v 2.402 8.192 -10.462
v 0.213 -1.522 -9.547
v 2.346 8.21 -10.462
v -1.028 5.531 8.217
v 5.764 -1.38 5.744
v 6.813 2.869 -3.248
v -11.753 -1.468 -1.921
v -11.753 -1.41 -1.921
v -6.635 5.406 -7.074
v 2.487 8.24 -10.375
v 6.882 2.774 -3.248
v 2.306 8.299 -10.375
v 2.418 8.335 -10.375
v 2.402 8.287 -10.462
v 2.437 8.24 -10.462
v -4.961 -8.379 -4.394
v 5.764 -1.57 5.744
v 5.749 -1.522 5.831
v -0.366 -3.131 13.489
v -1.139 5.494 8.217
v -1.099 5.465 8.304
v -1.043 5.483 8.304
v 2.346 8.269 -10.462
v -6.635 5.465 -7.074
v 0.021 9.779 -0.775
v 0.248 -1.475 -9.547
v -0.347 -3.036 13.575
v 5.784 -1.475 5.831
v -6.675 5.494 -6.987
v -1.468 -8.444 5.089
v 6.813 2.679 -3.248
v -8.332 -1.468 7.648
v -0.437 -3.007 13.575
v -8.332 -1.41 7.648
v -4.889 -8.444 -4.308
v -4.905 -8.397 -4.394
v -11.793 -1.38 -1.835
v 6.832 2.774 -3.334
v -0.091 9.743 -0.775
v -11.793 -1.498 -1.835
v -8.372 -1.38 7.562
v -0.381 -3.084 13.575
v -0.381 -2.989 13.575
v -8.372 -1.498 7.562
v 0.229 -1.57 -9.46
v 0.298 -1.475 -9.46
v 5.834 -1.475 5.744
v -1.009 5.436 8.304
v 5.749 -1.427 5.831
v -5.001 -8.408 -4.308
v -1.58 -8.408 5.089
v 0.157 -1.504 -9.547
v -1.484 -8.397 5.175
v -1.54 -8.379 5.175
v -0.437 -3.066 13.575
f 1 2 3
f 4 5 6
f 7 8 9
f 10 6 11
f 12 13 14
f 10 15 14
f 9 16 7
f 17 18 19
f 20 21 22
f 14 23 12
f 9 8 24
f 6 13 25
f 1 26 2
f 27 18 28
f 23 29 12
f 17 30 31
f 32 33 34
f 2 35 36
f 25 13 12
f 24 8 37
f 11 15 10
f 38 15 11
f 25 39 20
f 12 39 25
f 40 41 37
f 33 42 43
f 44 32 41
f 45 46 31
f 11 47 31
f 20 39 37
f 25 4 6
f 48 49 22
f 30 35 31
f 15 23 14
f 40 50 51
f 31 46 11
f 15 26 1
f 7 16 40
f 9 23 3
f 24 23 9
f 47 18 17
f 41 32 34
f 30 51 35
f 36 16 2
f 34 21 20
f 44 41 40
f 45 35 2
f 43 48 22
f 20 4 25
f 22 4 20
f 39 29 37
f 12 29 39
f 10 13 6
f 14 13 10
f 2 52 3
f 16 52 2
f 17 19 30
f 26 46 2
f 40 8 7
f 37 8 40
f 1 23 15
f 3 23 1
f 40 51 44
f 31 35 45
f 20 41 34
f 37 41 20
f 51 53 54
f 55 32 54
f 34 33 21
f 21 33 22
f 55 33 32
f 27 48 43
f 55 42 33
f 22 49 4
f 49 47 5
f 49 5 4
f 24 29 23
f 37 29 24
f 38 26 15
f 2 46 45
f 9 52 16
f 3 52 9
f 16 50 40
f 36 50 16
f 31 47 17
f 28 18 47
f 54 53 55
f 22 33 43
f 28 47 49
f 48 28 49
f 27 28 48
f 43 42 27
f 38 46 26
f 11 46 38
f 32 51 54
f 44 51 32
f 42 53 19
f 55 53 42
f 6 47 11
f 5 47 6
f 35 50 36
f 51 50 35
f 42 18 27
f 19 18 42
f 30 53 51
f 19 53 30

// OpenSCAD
// Auto-generated OpenSCAD file

    inner_points = 10*[[0.019787791635657748, -0.14747479922424916, -0.945991098230778], [-0.6594221428128932, 0.5435520084277206, -0.6986940783281456], [-0.14991280650270666, -0.8349261534325039, 0.5088787692620549], [-0.8291227409512576, -0.14389934578053432, 0.7561757891646873], [0.678236401517591, 0.27739350328859563, -0.3247565582505837], [-0.0009735329309600027, 0.9684203109405655, -0.07745953834795122], [0.5733556639568946, -0.1474747992242489, 0.5744024690680427], [-0.10585427049165638, 0.5435520084277209, 0.8216994889706752], [-0.49203656667719314, -0.8349261534325041, -0.430776131605317], [-1.171246501125744, -0.14389934578053443, -0.18347911170268458], [0.2386660365849197, 0.823975401935654, -1.03751607052968], [-0.039688911151111894, -0.3036310288659764, 1.3488645926575207]];

    outer_points = 10*[[-0.8032370415536442, 0.4940095944296054, 0.2904678526749993], [-0.8203617651133189, -0.05438177544706052, -0.5455785869967444], [0.8144576288440243, 0.4940095944296054, 0.257332643050285], [0.7973329052843495, -0.05438177544706052, -0.5787137966214586], [-0.4836041683692091, -0.30128460130981144, 0.8055814019076486], [-0.5007288919288839, -0.8496759711864774, -0.030465037764095003], [0.5161861213561083, -0.30128460130981144, 0.7851027161352226], [0.4990613977964336, -0.8496759711864774, -0.05094372353652105], [-0.0009907313780924036, 0.9855284384520768, -0.04836851458879643], [-0.01811545493776716, 0.43713706857541085, -0.8844149542605402], [-1.321886530779726, -0.3605543525439317, 0.26357607217362455], [1.3315709135143465, -0.3605543525439317, 0.20922535305718643]];

    // Convex hull for inner set (I)
    module inner_hull() {
        hull() {
            for (p = inner_points) {
                translate(p) sphere(r=0.1);
            }
        }
    }

    // Convex hull for outer set (O) minus inner hull (O \ I)
    module outer_minus_inner() {
        difference() {
            hull() {
                for (p = outer_points) {
                    translate(p) sphere(r=0.1);
                }
            }
            inner_hull(); // Subtract inner hull
        }
    }

    // Convex hull for outer set (O) minus all translated inner hulls
    module outer_minus_AllTranslationInner() {
        difference() {
            hull() {
                for (p = outer_points) {
                    translate(p) sphere(r=0.1);
                }
            }
            hull() {
                translate([0,0,50]) inner_hull();
                translate([0,0,-50]) inner_hull();
            }; // Subtract translated inner hulls
        }
    }

    // Difference between outer_minus_inner and outer_minus_AllTranslationInner
    module outer_minus_inner_diff() {
        difference() {
            // Outer minus inner
            difference() {
                hull() {
                    for (p = outer_points) {
                        translate(p) sphere(r=0.1);
                    }
                }
                inner_hull();
            }

            // Subtract Outer minus AllTranslationInner
            difference() {
                hull() {
                    for (p = outer_points) {
                        translate(p) sphere(r=0.1);
                    }
                }
                hull() {
                    translate([0,0,50]) inner_hull();
                    translate([0,0,-50]) inner_hull();
                };
            }
        }
    }

    // Rendering all with colors applied
    color([1, 0, 0, 0.5]) inner_hull(); // Transparent red
    
